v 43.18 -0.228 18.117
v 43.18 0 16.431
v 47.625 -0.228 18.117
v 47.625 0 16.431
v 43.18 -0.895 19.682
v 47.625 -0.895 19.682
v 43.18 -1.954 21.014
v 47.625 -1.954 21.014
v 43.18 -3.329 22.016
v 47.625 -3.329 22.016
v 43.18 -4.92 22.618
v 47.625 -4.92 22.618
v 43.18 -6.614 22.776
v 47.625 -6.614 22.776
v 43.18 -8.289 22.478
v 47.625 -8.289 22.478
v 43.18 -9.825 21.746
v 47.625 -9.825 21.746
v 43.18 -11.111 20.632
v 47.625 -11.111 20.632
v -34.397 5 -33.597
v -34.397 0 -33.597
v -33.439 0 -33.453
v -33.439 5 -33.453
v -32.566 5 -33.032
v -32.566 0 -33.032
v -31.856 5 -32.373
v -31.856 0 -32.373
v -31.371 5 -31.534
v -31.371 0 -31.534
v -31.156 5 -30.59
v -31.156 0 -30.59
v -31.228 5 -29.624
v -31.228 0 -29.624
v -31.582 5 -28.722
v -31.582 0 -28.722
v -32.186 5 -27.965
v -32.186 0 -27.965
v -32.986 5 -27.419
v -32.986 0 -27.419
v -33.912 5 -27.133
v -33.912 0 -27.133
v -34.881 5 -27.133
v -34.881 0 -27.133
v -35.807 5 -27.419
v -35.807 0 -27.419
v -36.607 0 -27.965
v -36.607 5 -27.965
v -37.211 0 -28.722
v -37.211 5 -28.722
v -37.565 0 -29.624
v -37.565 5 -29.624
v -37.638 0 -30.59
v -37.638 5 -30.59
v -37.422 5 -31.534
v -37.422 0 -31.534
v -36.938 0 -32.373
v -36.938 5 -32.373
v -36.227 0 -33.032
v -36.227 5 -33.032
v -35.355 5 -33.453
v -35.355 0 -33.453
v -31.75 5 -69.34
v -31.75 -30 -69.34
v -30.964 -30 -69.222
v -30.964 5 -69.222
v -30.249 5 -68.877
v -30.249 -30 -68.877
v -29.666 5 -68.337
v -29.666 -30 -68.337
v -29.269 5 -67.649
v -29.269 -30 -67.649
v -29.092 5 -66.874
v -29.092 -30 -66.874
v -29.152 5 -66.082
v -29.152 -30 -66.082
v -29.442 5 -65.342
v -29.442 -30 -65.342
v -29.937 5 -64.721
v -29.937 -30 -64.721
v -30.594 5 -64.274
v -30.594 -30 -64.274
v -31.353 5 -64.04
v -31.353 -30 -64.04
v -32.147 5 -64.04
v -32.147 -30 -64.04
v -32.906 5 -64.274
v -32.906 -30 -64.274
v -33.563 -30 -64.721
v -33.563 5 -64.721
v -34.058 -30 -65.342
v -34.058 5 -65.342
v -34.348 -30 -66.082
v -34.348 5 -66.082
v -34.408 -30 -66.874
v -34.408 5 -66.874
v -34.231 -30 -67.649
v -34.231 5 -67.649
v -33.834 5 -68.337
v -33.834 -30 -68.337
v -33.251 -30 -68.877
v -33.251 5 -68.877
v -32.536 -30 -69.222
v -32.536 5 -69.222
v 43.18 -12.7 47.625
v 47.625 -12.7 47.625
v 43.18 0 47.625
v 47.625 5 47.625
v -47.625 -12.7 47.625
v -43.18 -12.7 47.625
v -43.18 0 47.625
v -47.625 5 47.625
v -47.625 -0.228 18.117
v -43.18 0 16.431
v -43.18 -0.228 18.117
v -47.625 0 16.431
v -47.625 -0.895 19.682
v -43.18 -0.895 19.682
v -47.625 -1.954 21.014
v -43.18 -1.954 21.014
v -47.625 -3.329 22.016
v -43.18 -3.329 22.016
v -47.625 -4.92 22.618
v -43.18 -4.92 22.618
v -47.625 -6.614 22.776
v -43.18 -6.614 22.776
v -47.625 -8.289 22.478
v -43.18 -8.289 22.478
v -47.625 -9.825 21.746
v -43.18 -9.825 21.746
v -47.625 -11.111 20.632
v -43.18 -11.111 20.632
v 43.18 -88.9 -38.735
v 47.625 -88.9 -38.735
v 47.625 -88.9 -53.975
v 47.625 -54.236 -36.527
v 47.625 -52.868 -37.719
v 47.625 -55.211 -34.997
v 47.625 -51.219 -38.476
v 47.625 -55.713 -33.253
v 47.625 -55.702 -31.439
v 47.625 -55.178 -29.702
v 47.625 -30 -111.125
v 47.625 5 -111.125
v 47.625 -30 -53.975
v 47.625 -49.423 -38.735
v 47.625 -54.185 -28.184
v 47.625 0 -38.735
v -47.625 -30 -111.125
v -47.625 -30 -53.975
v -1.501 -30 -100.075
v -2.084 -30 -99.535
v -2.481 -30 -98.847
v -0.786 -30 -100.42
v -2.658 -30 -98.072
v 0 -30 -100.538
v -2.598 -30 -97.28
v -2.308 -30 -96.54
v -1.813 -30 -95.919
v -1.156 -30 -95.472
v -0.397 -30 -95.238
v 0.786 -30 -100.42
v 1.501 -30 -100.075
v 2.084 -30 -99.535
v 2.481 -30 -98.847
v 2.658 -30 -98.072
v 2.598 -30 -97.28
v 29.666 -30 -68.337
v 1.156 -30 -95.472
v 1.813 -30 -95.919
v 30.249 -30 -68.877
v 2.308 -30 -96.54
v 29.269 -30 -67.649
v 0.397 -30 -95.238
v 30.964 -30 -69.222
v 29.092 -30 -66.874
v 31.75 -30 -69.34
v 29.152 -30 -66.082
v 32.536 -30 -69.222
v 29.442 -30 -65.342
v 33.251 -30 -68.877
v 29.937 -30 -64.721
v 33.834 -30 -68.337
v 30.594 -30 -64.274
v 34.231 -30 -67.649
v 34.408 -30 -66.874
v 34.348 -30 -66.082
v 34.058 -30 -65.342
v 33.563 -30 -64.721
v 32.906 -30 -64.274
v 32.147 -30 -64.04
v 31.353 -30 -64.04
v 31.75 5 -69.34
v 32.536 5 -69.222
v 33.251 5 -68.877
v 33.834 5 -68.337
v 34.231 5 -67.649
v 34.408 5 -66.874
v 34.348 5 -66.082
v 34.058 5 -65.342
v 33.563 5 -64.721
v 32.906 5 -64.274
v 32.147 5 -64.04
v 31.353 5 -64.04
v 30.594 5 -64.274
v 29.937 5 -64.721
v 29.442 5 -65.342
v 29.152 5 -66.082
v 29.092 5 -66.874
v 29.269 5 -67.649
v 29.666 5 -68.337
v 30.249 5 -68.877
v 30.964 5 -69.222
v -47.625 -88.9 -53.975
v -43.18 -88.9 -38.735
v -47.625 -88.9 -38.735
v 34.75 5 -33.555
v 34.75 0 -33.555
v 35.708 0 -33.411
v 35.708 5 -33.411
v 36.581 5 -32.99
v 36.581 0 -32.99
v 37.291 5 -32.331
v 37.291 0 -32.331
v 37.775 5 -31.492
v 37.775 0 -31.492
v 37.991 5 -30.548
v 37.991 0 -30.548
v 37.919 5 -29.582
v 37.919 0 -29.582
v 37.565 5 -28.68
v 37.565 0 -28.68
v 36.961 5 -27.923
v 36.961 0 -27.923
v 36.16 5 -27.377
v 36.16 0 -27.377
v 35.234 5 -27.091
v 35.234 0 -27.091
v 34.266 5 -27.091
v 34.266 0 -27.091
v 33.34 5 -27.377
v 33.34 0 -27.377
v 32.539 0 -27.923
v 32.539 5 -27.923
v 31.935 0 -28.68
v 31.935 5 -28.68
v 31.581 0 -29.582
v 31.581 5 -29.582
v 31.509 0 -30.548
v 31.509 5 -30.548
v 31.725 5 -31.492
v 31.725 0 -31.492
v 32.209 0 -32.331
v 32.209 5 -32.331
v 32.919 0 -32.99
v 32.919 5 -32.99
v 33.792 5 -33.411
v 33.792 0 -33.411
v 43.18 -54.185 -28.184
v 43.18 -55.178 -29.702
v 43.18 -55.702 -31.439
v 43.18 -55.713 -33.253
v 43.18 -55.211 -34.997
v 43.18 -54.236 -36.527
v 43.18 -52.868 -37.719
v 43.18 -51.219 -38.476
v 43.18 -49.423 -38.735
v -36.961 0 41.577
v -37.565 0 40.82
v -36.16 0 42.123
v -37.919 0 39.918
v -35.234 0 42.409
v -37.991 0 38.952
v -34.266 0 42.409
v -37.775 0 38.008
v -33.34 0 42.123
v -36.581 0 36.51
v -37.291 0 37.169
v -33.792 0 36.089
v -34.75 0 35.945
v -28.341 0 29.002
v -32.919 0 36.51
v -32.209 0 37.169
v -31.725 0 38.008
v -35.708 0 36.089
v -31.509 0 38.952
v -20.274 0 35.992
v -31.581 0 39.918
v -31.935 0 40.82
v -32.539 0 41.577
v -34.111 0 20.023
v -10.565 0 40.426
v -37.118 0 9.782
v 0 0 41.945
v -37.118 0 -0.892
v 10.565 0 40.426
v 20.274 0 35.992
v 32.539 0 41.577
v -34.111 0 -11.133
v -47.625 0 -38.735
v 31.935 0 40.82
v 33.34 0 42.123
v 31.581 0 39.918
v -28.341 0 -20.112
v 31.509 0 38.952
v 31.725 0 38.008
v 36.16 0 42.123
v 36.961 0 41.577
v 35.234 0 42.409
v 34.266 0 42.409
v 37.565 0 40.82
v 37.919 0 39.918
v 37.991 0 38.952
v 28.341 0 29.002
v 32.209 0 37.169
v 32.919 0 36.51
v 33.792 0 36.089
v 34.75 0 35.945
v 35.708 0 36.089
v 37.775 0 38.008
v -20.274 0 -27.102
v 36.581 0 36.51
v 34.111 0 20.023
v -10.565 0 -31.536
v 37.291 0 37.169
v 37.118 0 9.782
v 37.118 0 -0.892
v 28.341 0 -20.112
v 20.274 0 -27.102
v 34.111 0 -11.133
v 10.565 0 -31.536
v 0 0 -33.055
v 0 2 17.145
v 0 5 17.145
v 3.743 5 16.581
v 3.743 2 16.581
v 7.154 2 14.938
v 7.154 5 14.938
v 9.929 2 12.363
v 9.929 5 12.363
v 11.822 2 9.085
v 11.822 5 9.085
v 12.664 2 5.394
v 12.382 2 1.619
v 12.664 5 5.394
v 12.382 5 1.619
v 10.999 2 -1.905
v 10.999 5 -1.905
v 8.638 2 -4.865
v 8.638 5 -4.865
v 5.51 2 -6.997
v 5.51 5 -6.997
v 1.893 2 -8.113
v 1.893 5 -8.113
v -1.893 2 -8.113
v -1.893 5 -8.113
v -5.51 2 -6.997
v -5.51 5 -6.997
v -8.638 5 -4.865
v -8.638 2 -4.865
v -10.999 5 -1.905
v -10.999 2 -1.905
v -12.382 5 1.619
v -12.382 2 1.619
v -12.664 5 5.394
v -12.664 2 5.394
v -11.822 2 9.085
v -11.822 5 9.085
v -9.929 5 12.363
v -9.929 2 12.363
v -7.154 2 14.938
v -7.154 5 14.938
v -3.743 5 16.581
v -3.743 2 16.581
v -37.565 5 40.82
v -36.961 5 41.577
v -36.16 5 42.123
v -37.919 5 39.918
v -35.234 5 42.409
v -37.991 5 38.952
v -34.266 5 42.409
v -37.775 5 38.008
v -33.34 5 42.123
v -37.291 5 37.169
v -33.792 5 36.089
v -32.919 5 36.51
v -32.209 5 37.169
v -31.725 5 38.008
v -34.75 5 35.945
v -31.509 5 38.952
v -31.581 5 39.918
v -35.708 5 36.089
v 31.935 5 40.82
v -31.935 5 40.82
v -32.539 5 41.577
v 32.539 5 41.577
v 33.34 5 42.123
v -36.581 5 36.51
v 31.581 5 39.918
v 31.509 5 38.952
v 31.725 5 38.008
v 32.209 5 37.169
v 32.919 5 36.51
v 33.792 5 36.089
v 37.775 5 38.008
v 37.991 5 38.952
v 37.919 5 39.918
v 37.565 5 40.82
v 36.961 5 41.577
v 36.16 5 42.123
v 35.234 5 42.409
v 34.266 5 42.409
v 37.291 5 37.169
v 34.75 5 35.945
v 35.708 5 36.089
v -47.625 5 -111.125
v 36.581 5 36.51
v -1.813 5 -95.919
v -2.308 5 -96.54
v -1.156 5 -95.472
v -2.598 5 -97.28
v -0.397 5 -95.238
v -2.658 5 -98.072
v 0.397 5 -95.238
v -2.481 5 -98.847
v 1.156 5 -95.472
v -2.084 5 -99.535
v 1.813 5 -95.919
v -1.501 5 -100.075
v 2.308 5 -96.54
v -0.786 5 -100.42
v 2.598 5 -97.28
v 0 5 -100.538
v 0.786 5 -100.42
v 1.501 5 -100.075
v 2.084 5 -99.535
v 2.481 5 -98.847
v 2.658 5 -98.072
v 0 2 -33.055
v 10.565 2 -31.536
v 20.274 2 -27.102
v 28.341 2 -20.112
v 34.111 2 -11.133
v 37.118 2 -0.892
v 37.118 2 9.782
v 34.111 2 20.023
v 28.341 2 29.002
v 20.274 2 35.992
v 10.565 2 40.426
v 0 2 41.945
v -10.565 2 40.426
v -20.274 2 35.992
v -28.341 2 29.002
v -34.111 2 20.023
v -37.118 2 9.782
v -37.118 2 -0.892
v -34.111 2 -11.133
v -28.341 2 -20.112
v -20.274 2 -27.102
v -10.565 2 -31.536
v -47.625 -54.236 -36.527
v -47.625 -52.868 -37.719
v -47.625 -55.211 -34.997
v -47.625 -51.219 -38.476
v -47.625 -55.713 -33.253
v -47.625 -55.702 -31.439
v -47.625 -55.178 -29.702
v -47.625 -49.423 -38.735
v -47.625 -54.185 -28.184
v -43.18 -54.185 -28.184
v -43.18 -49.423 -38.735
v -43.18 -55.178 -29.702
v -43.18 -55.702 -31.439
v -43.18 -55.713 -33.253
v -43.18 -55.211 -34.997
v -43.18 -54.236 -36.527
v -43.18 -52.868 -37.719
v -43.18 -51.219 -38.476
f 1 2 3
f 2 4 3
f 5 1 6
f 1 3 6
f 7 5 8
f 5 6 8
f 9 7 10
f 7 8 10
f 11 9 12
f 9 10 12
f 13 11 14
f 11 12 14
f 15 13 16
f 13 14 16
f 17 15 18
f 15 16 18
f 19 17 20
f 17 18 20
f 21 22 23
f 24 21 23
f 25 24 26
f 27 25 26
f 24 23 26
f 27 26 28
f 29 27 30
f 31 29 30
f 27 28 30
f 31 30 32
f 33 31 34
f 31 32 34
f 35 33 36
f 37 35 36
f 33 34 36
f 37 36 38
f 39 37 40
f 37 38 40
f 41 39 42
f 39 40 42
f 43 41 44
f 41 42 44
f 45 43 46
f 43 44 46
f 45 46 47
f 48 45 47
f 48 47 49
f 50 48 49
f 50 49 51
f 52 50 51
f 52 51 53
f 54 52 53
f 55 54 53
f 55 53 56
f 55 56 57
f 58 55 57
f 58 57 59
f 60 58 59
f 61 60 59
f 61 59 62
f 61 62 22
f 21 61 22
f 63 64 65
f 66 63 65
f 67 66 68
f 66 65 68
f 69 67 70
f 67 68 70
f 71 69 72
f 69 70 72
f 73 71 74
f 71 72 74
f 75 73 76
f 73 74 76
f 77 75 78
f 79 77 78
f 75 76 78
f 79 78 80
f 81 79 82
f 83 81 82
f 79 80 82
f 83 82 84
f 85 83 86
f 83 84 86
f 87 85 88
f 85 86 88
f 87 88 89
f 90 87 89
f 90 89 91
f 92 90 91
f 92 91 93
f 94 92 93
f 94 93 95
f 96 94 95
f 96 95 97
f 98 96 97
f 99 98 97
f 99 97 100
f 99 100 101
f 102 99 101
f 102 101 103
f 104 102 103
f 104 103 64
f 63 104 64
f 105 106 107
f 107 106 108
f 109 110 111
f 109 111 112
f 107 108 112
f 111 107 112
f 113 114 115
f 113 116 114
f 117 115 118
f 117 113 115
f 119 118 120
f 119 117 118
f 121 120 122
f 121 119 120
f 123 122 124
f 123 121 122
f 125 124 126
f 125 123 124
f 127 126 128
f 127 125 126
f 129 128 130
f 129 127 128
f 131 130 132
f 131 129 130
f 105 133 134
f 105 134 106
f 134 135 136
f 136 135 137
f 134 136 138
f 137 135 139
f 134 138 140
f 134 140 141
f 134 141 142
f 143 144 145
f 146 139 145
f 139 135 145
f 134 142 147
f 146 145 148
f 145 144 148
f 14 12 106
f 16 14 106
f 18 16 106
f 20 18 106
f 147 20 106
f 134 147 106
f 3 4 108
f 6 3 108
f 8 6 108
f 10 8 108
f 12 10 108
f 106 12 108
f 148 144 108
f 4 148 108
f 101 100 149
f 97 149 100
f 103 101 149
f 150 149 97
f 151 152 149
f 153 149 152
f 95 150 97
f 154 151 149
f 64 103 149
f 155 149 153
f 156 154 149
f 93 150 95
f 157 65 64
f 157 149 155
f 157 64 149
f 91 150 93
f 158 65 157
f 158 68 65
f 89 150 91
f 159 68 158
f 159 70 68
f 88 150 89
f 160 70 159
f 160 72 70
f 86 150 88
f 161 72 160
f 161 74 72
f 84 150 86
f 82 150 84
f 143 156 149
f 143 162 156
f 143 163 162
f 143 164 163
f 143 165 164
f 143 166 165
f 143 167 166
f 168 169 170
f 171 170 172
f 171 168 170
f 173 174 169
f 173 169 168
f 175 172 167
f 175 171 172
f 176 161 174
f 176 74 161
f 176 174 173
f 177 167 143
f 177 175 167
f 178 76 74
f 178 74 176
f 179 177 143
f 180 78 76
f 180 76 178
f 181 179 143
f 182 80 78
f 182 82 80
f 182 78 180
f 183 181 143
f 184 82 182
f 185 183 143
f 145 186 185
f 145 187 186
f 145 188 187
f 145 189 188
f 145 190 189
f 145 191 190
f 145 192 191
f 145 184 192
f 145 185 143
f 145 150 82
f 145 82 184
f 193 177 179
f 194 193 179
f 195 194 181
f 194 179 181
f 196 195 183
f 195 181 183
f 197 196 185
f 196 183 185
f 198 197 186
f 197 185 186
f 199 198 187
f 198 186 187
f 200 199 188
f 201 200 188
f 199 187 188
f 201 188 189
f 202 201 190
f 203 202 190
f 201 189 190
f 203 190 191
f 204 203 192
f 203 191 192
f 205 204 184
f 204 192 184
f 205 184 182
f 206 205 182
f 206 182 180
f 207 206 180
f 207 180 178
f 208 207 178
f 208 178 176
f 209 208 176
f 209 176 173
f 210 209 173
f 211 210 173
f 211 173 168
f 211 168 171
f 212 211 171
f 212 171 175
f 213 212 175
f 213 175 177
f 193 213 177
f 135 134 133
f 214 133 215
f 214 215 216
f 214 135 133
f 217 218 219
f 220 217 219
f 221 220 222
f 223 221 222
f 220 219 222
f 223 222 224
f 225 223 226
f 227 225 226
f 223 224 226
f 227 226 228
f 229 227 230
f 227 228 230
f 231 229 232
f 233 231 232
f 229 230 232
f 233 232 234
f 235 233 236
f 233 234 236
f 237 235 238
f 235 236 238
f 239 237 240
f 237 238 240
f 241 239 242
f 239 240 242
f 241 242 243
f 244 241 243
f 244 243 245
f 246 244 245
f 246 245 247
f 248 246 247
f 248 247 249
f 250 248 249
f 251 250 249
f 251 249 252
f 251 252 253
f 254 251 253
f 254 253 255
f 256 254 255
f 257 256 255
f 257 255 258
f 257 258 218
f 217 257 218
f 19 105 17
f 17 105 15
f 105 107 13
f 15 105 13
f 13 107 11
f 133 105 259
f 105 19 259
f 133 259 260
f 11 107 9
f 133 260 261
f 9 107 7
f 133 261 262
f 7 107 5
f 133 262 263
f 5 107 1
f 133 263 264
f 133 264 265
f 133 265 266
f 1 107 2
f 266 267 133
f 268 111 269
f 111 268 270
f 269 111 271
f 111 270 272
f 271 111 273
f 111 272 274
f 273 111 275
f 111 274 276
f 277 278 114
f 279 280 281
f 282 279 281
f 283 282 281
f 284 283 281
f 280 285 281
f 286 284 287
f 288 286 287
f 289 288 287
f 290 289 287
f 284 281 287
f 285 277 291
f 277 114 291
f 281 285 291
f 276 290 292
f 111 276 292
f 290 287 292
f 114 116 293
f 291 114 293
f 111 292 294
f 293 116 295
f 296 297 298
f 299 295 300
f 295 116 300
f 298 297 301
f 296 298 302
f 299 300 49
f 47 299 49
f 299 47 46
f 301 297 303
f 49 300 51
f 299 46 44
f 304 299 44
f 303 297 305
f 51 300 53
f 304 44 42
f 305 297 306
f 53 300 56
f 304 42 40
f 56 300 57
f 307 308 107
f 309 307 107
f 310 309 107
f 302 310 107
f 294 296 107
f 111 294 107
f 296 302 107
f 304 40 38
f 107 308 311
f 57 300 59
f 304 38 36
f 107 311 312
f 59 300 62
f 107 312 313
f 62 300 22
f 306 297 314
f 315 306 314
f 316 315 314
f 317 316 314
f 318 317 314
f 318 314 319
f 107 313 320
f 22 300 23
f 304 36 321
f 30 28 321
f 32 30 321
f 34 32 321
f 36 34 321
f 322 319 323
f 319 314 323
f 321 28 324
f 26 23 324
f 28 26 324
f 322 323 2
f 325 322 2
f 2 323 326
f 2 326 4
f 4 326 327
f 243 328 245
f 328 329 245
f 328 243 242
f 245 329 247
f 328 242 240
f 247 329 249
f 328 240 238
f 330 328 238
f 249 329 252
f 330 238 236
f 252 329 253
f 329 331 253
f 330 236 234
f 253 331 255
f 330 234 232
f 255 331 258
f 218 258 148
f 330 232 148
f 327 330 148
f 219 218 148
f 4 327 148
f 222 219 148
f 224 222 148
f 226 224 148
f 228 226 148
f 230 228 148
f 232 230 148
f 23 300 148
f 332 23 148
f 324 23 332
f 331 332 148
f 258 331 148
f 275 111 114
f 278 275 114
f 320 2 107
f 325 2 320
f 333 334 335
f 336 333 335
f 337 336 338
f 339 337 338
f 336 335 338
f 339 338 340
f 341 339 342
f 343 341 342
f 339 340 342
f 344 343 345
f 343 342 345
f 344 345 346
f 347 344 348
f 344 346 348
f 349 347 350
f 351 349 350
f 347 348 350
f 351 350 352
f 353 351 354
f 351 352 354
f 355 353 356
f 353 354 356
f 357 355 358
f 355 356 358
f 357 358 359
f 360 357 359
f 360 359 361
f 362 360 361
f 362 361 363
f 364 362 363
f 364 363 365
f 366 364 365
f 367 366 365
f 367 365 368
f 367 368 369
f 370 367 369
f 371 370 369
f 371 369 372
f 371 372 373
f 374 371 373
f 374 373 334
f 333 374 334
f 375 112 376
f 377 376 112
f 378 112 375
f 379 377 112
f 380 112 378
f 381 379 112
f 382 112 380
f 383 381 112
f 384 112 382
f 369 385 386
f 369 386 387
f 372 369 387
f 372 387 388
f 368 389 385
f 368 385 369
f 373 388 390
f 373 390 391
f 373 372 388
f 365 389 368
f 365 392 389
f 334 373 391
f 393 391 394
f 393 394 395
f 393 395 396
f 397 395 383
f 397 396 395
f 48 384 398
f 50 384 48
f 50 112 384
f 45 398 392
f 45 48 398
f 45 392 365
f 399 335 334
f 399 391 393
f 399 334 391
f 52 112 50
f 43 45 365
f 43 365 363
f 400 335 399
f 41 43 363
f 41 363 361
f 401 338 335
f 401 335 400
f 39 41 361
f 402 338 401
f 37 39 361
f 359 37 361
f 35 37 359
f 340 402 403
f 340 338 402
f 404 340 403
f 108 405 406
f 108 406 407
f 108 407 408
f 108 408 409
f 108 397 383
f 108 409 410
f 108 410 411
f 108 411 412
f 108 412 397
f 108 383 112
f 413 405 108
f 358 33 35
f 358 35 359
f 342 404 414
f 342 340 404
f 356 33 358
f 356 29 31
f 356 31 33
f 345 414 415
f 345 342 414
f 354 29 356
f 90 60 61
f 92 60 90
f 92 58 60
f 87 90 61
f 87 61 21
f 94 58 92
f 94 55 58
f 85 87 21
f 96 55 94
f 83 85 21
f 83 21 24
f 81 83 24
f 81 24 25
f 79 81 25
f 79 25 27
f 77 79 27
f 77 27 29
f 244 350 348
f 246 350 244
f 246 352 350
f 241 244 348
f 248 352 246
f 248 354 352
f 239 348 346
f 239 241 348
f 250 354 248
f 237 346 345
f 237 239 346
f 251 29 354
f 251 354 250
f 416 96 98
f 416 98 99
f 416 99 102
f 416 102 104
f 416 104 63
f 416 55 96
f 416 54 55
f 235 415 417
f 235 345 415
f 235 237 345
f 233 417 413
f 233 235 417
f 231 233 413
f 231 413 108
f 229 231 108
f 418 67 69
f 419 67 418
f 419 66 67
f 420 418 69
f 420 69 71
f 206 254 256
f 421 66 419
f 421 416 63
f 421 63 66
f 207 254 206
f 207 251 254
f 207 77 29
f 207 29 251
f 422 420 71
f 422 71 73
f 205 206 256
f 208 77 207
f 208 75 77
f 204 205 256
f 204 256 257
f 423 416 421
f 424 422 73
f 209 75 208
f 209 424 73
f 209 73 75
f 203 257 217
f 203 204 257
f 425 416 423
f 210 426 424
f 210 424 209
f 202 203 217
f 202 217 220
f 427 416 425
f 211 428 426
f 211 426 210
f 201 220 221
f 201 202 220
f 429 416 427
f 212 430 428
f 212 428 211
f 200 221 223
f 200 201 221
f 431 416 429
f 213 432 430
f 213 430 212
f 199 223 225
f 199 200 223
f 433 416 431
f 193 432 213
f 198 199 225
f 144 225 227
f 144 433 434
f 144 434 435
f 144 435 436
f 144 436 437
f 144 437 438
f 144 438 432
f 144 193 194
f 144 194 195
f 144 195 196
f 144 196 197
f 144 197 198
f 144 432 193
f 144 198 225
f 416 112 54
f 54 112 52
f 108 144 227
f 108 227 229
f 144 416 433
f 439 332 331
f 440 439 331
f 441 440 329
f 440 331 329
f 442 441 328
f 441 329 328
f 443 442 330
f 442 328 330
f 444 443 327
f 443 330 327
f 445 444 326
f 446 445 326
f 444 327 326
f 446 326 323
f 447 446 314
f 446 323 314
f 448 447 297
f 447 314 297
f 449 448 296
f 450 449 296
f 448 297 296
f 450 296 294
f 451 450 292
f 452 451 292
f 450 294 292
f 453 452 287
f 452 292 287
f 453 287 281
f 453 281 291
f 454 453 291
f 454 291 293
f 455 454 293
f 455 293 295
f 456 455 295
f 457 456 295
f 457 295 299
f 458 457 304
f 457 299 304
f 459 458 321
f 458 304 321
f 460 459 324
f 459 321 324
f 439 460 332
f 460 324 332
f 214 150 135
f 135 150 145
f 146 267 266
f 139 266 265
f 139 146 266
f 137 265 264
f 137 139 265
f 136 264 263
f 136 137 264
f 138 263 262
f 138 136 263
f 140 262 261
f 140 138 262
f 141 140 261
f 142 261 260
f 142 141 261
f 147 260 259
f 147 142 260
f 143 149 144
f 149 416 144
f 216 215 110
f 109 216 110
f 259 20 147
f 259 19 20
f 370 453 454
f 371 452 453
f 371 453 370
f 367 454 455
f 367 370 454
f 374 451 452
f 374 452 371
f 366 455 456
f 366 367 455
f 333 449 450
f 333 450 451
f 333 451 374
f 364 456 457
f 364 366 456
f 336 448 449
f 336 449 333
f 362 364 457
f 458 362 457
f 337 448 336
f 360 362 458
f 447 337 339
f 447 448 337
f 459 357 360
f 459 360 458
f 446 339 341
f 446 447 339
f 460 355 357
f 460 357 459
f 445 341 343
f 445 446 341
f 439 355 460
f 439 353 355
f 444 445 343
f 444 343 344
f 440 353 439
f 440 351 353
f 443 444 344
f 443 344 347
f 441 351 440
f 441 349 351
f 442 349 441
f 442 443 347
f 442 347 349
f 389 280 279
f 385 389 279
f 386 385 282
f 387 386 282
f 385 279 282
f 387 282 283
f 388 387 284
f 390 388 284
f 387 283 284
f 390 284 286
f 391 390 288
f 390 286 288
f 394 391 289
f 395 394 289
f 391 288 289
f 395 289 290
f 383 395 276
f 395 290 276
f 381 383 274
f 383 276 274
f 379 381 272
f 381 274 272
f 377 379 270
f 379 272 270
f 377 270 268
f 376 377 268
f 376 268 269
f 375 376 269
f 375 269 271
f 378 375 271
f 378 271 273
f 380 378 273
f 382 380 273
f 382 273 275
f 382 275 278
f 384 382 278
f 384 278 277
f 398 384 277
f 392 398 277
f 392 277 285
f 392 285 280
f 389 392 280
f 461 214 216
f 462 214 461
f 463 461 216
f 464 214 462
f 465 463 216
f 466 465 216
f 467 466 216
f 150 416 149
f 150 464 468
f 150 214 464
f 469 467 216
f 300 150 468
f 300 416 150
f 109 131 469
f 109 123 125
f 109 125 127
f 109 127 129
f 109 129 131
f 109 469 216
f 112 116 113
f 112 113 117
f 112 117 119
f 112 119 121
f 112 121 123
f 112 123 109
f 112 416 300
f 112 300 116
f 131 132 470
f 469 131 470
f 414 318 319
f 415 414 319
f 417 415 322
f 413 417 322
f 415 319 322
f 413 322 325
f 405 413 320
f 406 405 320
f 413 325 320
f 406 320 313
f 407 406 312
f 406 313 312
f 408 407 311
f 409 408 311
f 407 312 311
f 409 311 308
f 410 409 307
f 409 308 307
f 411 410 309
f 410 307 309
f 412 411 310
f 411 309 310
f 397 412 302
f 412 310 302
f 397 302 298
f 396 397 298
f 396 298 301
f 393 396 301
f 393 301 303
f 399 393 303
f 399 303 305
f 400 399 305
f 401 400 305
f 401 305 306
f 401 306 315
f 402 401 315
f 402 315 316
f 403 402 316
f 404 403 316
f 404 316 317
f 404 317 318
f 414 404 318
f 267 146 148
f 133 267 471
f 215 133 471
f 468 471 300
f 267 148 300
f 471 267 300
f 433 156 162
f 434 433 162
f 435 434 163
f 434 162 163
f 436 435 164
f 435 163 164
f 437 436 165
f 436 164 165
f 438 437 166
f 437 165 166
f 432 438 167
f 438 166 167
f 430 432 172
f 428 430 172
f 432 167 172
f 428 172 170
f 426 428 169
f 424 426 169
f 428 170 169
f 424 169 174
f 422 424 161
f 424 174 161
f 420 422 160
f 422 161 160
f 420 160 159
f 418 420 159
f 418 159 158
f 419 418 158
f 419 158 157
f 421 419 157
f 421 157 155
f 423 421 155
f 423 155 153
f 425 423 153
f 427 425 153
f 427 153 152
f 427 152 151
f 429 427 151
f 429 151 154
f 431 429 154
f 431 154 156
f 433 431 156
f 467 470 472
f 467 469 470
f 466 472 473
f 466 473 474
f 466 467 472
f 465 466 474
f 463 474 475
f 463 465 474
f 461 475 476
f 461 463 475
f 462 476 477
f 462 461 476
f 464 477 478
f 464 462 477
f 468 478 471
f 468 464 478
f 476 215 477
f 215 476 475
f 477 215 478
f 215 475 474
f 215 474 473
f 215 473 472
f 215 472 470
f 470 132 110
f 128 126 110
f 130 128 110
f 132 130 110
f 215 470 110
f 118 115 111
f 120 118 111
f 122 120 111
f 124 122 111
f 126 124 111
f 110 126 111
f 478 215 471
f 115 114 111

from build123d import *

# Parameters (mm, degrees)
SKETCH1_W                      = 95.25
SKETCH1_H                      = 63.5
SKETCH1_H_2                    = 95.25
BOSS_EXTRUDE1_DEPTH            = 5
BOSS_EXTRUDE2_DEPTH            = 88.9
CUT_EXTRUDE1_REACH             = 170.812
CUT_EXTRUDE1_DIRECTION_2_REACH = 170.812
SKETCH4_R                      = 37.5
CUT_EXTRUDE2_DEPTH             = 2
CUT_EXTRUDE3_REACH             = 170.812
CUT_EXTRUDE3_DIRECTION_2_REACH = 170.812
FILLET1_R                      = 6.35
SKETCH6_W                      = 95.25
SKETCH6_H                      = 57.15
BOSS_EXTRUDE3_DEPTH            = 30
CUT_EXTRUDE4_REACH             = 136.485
SKETCH7_R                      = 2.665000004
CUT_EXTRUDE5_REACH             = 155.082
SKETCH8_R                      = 12.7
CUT_EXTRUDE6_REACH             = 152.067
SKETCH9_R                      = 3.25


with BuildPart() as part:
    # Sketch1 → Boss-Extrude1 (new body)
    with BuildSketch(Plane(origin=(0, 0, 0), x_dir=(1, 0, 0), z_dir=(0, 1, 0))):
        with Locations((0, 79.375)):
            Rectangle(SKETCH1_W, SKETCH1_H)
        Rectangle(SKETCH1_W, SKETCH1_H_2)
    extrude(amount=BOSS_EXTRUDE1_DEPTH)

    # Sketch2 → Boss-Extrude2 (add)
    with BuildSketch(Plane(origin=(0, 0, 0), x_dir=(-1, 0, 0), z_dir=(0, -1, 0))):
        Polygon((43.18, 38.735), (43.18, -47.625), (47.625, -47.625), (47.625, 53.975), (-47.625, 53.975), (-47.625, -47.625), (-43.18, -47.625), (-43.18, 38.735), align=None)
    extrude(amount=BOSS_EXTRUDE2_DEPTH)

    # Sketch3 → Cut-Extrude1 (cut, up to next)
    with BuildSketch(Plane.ZY.offset(-43.18), mode=Mode.PRIVATE) as cut_extrude1_sk1:
        Polygon((-38.735, -88.9), (47.625, -12.7), (47.625, -88.9), align=None)
    cut_extrude1_tool1 = extrude(cut_extrude1_sk1.sketch, amount=-CUT_EXTRUDE1_REACH, mode=Mode.PRIVATE) & part.part
    add(cut_extrude1_tool1.solids().sort_by_distance((43.18, -63.5, 18.838333))[0], mode=Mode.SUBTRACT)

    # Sketch3 → Cut-Extrude1 direction 2 (cut, up to next)
    with BuildSketch(Plane.ZY.offset(-43.18), mode=Mode.PRIVATE) as cut_extrude1_direction_2_sk1:
        Polygon((-38.735, -88.9), (47.625, -12.7), (47.625, -88.9), align=None)
    cut_extrude1_direction_2_tool1 = extrude(cut_extrude1_direction_2_sk1.sketch, amount=CUT_EXTRUDE1_DIRECTION_2_REACH, mode=Mode.PRIVATE) & part.part
    add(cut_extrude1_direction_2_tool1.solids().sort_by_distance((43.18, -63.5, 18.838333))[0], mode=Mode.SUBTRACT)

    # Sketch4 → Cut-Extrude2 (cut)
    with BuildSketch(Plane(origin=(0, 0, 0), x_dir=(-1, 0, 0), z_dir=(0, -1, 0))):
        with Locations(Location((0, -4.445, 0), (0, 0, 90))):
            Circle(SKETCH4_R)
    extrude(amount=-CUT_EXTRUDE2_DEPTH, mode=Mode.SUBTRACT)

    # Sketch5 → Cut-Extrude3 (cut, up to next)
    with BuildSketch(Plane(origin=(-43.18, 0, 0), x_dir=(0, 0, -1), z_dir=(1, 0, 0)), mode=Mode.PRIVATE) as cut_extrude3_sk1:
        Polygon((38.735, 0), (-33.225441849, 0), (38.735, -63.494507514), align=None)
    cut_extrude3_tool1 = extrude(cut_extrude3_sk1.sketch, amount=-CUT_EXTRUDE3_REACH, mode=Mode.PRIVATE) & part.part
    add(cut_extrude3_tool1.solids().sort_by_distance((-43.18, -21.164836, -14.748186))[0], mode=Mode.SUBTRACT)

    # Sketch5 → Cut-Extrude3 direction 2 (cut, up to next)
    with BuildSketch(Plane(origin=(-43.18, 0, 0), x_dir=(0, 0, -1), z_dir=(1, 0, 0)), mode=Mode.PRIVATE) as cut_extrude3_direction_2_sk1:
        Polygon((38.735, 0), (-33.225441849, 0), (38.735, -63.494507514), align=None)
    cut_extrude3_direction_2_tool1 = extrude(cut_extrude3_direction_2_sk1.sketch, amount=CUT_EXTRUDE3_DIRECTION_2_REACH, mode=Mode.PRIVATE) & part.part
    add(cut_extrude3_direction_2_tool1.solids().sort_by_distance((-43.18, -21.164836, -14.748186))[0], mode=Mode.SUBTRACT)

    # Fillet1
    fillet1_edges = [part.edges().sort_by_distance(p)[0] for p in [
        (45.4025, -63.494507514, -38.735),
        (45.4025, 0, 33.225441849),
        (-45.4025, 0, 33.225441849),
        (-45.4025, -63.494507514, -38.735),
    ]]
    fillet(fillet1_edges, radius=FILLET1_R)

    # Sketch6 → Boss-Extrude3 (add)
    with BuildSketch(Plane.XZ):
        with Locations((0, -82.55)):
            Rectangle(SKETCH6_W, SKETCH6_H)
    extrude(amount=BOSS_EXTRUDE3_DEPTH)

    # Sketch7 → Cut-Extrude4 (cut, up to next)
    with BuildSketch(Plane(origin=(0, -30, 0), x_dir=(-1, 0, 0), z_dir=(0, -1, 0)), mode=Mode.PRIVATE) as cut_extrude4_sk1:
        with Locations(Location((0, 97.872945695, 0), (0, 0, 90))):
            Circle(SKETCH7_R)
    cut_extrude4_tool1 = extrude(cut_extrude4_sk1.sketch, amount=-CUT_EXTRUDE4_REACH, mode=Mode.PRIVATE) & part.part
    # Sketch7 → Cut-Extrude4 (cut, up to next)
    with BuildSketch(Plane(origin=(0, -30, 0), x_dir=(-1, 0, 0), z_dir=(0, -1, 0)), mode=Mode.PRIVATE) as cut_extrude4_sk2:
        with Locations(Location((31.75, 66.675, 0), (0, 0, 90))):
            Circle(SKETCH7_R)
    cut_extrude4_tool2 = extrude(cut_extrude4_sk2.sketch, amount=-CUT_EXTRUDE4_REACH, mode=Mode.PRIVATE) & part.part
    # Sketch7 → Cut-Extrude4 (cut, up to next)
    with BuildSketch(Plane(origin=(0, -30, 0), x_dir=(-1, 0, 0), z_dir=(0, -1, 0)), mode=Mode.PRIVATE) as cut_extrude4_sk3:
        with Locations(Location((-31.75, 66.675, 0), (0, 0, 90))):
            Circle(SKETCH7_R)
    cut_extrude4_tool3 = extrude(cut_extrude4_sk3.sketch, amount=-CUT_EXTRUDE4_REACH, mode=Mode.PRIVATE) & part.part
    add(cut_extrude4_tool1.solids().sort_by_distance((0, -30, -97.872946))[0], mode=Mode.SUBTRACT)
    add(cut_extrude4_tool2.solids().sort_by_distance((-31.75, -30, -66.675))[0], mode=Mode.SUBTRACT)
    add(cut_extrude4_tool3.solids().sort_by_distance((31.75, -30, -66.675))[0], mode=Mode.SUBTRACT)

    # Sketch8 → Cut-Extrude5 (cut, up to next)
    with BuildSketch(Plane(origin=(0, 5, 0), x_dir=(1, 0, 0), z_dir=(0, 1, 0)), mode=Mode.PRIVATE) as cut_extrude5_sk1:
        with Locations(Location((0, -4.445, 0), (0, 0, 270))):
            Circle(SKETCH8_R)
    cut_extrude5_tool1 = extrude(cut_extrude5_sk1.sketch, amount=-CUT_EXTRUDE5_REACH, mode=Mode.PRIVATE) & part.part
    add(cut_extrude5_tool1.solids().sort_by_distance((0, 5, 4.445))[0], mode=Mode.SUBTRACT)

    # Sketch9 → Cut-Extrude6 (cut, up to next)
    with BuildSketch(Plane(origin=(0, 0, 0), x_dir=(-1, 0, 0), z_dir=(0, -1, 0)), mode=Mode.PRIVATE) as cut_extrude6_sk1:
        with Locations(Location((34.75, -39.195, 0), (0, 0, 90))):
            Circle(SKETCH9_R)
    cut_extrude6_tool1 = extrude(cut_extrude6_sk1.sketch, amount=-CUT_EXTRUDE6_REACH, mode=Mode.PRIVATE) & part.part
    # Sketch9 → Cut-Extrude6 (cut, up to next)
    with BuildSketch(Plane(origin=(0, 0, 0), x_dir=(-1, 0, 0), z_dir=(0, -1, 0)), mode=Mode.PRIVATE) as cut_extrude6_sk2:
        with Locations(Location((-34.75, -39.195, 0), (0, 0, 90))):
            Circle(SKETCH9_R)
    cut_extrude6_tool2 = extrude(cut_extrude6_sk2.sketch, amount=-CUT_EXTRUDE6_REACH, mode=Mode.PRIVATE) & part.part
    # Sketch9 → Cut-Extrude6 (cut, up to next)
    with BuildSketch(Plane(origin=(0, 0, 0), x_dir=(-1, 0, 0), z_dir=(0, -1, 0)), mode=Mode.PRIVATE) as cut_extrude6_sk3:
        with Locations(Location((34.396603139, 30.34702737, 0), (0, 0, 90))):
            Circle(SKETCH9_R)
    cut_extrude6_tool3 = extrude(cut_extrude6_sk3.sketch, amount=-CUT_EXTRUDE6_REACH, mode=Mode.PRIVATE) & part.part
    # Sketch9 → Cut-Extrude6 (cut, up to next)
    with BuildSketch(Plane(origin=(0, 0, 0), x_dir=(-1, 0, 0), z_dir=(0, -1, 0)), mode=Mode.PRIVATE) as cut_extrude6_sk4:
        with Locations(Location((-34.75, 30.305, 0), (0, 0, 90))):
            Circle(SKETCH9_R)
    cut_extrude6_tool4 = extrude(cut_extrude6_sk4.sketch, amount=-CUT_EXTRUDE6_REACH, mode=Mode.PRIVATE) & part.part
    add(cut_extrude6_tool1.solids().sort_by_distance((-34.75, 0, 39.195))[0], mode=Mode.SUBTRACT)
    add(cut_extrude6_tool2.solids().sort_by_distance((34.75, 0, 39.195))[0], mode=Mode.SUBTRACT)
    add(cut_extrude6_tool3.solids().sort_by_distance((-34.396603, 0, -30.347027))[0], mode=Mode.SUBTRACT)
    add(cut_extrude6_tool4.solids().sort_by_distance((34.75, 0, -30.305))[0], mode=Mode.SUBTRACT)


solid = part.part
